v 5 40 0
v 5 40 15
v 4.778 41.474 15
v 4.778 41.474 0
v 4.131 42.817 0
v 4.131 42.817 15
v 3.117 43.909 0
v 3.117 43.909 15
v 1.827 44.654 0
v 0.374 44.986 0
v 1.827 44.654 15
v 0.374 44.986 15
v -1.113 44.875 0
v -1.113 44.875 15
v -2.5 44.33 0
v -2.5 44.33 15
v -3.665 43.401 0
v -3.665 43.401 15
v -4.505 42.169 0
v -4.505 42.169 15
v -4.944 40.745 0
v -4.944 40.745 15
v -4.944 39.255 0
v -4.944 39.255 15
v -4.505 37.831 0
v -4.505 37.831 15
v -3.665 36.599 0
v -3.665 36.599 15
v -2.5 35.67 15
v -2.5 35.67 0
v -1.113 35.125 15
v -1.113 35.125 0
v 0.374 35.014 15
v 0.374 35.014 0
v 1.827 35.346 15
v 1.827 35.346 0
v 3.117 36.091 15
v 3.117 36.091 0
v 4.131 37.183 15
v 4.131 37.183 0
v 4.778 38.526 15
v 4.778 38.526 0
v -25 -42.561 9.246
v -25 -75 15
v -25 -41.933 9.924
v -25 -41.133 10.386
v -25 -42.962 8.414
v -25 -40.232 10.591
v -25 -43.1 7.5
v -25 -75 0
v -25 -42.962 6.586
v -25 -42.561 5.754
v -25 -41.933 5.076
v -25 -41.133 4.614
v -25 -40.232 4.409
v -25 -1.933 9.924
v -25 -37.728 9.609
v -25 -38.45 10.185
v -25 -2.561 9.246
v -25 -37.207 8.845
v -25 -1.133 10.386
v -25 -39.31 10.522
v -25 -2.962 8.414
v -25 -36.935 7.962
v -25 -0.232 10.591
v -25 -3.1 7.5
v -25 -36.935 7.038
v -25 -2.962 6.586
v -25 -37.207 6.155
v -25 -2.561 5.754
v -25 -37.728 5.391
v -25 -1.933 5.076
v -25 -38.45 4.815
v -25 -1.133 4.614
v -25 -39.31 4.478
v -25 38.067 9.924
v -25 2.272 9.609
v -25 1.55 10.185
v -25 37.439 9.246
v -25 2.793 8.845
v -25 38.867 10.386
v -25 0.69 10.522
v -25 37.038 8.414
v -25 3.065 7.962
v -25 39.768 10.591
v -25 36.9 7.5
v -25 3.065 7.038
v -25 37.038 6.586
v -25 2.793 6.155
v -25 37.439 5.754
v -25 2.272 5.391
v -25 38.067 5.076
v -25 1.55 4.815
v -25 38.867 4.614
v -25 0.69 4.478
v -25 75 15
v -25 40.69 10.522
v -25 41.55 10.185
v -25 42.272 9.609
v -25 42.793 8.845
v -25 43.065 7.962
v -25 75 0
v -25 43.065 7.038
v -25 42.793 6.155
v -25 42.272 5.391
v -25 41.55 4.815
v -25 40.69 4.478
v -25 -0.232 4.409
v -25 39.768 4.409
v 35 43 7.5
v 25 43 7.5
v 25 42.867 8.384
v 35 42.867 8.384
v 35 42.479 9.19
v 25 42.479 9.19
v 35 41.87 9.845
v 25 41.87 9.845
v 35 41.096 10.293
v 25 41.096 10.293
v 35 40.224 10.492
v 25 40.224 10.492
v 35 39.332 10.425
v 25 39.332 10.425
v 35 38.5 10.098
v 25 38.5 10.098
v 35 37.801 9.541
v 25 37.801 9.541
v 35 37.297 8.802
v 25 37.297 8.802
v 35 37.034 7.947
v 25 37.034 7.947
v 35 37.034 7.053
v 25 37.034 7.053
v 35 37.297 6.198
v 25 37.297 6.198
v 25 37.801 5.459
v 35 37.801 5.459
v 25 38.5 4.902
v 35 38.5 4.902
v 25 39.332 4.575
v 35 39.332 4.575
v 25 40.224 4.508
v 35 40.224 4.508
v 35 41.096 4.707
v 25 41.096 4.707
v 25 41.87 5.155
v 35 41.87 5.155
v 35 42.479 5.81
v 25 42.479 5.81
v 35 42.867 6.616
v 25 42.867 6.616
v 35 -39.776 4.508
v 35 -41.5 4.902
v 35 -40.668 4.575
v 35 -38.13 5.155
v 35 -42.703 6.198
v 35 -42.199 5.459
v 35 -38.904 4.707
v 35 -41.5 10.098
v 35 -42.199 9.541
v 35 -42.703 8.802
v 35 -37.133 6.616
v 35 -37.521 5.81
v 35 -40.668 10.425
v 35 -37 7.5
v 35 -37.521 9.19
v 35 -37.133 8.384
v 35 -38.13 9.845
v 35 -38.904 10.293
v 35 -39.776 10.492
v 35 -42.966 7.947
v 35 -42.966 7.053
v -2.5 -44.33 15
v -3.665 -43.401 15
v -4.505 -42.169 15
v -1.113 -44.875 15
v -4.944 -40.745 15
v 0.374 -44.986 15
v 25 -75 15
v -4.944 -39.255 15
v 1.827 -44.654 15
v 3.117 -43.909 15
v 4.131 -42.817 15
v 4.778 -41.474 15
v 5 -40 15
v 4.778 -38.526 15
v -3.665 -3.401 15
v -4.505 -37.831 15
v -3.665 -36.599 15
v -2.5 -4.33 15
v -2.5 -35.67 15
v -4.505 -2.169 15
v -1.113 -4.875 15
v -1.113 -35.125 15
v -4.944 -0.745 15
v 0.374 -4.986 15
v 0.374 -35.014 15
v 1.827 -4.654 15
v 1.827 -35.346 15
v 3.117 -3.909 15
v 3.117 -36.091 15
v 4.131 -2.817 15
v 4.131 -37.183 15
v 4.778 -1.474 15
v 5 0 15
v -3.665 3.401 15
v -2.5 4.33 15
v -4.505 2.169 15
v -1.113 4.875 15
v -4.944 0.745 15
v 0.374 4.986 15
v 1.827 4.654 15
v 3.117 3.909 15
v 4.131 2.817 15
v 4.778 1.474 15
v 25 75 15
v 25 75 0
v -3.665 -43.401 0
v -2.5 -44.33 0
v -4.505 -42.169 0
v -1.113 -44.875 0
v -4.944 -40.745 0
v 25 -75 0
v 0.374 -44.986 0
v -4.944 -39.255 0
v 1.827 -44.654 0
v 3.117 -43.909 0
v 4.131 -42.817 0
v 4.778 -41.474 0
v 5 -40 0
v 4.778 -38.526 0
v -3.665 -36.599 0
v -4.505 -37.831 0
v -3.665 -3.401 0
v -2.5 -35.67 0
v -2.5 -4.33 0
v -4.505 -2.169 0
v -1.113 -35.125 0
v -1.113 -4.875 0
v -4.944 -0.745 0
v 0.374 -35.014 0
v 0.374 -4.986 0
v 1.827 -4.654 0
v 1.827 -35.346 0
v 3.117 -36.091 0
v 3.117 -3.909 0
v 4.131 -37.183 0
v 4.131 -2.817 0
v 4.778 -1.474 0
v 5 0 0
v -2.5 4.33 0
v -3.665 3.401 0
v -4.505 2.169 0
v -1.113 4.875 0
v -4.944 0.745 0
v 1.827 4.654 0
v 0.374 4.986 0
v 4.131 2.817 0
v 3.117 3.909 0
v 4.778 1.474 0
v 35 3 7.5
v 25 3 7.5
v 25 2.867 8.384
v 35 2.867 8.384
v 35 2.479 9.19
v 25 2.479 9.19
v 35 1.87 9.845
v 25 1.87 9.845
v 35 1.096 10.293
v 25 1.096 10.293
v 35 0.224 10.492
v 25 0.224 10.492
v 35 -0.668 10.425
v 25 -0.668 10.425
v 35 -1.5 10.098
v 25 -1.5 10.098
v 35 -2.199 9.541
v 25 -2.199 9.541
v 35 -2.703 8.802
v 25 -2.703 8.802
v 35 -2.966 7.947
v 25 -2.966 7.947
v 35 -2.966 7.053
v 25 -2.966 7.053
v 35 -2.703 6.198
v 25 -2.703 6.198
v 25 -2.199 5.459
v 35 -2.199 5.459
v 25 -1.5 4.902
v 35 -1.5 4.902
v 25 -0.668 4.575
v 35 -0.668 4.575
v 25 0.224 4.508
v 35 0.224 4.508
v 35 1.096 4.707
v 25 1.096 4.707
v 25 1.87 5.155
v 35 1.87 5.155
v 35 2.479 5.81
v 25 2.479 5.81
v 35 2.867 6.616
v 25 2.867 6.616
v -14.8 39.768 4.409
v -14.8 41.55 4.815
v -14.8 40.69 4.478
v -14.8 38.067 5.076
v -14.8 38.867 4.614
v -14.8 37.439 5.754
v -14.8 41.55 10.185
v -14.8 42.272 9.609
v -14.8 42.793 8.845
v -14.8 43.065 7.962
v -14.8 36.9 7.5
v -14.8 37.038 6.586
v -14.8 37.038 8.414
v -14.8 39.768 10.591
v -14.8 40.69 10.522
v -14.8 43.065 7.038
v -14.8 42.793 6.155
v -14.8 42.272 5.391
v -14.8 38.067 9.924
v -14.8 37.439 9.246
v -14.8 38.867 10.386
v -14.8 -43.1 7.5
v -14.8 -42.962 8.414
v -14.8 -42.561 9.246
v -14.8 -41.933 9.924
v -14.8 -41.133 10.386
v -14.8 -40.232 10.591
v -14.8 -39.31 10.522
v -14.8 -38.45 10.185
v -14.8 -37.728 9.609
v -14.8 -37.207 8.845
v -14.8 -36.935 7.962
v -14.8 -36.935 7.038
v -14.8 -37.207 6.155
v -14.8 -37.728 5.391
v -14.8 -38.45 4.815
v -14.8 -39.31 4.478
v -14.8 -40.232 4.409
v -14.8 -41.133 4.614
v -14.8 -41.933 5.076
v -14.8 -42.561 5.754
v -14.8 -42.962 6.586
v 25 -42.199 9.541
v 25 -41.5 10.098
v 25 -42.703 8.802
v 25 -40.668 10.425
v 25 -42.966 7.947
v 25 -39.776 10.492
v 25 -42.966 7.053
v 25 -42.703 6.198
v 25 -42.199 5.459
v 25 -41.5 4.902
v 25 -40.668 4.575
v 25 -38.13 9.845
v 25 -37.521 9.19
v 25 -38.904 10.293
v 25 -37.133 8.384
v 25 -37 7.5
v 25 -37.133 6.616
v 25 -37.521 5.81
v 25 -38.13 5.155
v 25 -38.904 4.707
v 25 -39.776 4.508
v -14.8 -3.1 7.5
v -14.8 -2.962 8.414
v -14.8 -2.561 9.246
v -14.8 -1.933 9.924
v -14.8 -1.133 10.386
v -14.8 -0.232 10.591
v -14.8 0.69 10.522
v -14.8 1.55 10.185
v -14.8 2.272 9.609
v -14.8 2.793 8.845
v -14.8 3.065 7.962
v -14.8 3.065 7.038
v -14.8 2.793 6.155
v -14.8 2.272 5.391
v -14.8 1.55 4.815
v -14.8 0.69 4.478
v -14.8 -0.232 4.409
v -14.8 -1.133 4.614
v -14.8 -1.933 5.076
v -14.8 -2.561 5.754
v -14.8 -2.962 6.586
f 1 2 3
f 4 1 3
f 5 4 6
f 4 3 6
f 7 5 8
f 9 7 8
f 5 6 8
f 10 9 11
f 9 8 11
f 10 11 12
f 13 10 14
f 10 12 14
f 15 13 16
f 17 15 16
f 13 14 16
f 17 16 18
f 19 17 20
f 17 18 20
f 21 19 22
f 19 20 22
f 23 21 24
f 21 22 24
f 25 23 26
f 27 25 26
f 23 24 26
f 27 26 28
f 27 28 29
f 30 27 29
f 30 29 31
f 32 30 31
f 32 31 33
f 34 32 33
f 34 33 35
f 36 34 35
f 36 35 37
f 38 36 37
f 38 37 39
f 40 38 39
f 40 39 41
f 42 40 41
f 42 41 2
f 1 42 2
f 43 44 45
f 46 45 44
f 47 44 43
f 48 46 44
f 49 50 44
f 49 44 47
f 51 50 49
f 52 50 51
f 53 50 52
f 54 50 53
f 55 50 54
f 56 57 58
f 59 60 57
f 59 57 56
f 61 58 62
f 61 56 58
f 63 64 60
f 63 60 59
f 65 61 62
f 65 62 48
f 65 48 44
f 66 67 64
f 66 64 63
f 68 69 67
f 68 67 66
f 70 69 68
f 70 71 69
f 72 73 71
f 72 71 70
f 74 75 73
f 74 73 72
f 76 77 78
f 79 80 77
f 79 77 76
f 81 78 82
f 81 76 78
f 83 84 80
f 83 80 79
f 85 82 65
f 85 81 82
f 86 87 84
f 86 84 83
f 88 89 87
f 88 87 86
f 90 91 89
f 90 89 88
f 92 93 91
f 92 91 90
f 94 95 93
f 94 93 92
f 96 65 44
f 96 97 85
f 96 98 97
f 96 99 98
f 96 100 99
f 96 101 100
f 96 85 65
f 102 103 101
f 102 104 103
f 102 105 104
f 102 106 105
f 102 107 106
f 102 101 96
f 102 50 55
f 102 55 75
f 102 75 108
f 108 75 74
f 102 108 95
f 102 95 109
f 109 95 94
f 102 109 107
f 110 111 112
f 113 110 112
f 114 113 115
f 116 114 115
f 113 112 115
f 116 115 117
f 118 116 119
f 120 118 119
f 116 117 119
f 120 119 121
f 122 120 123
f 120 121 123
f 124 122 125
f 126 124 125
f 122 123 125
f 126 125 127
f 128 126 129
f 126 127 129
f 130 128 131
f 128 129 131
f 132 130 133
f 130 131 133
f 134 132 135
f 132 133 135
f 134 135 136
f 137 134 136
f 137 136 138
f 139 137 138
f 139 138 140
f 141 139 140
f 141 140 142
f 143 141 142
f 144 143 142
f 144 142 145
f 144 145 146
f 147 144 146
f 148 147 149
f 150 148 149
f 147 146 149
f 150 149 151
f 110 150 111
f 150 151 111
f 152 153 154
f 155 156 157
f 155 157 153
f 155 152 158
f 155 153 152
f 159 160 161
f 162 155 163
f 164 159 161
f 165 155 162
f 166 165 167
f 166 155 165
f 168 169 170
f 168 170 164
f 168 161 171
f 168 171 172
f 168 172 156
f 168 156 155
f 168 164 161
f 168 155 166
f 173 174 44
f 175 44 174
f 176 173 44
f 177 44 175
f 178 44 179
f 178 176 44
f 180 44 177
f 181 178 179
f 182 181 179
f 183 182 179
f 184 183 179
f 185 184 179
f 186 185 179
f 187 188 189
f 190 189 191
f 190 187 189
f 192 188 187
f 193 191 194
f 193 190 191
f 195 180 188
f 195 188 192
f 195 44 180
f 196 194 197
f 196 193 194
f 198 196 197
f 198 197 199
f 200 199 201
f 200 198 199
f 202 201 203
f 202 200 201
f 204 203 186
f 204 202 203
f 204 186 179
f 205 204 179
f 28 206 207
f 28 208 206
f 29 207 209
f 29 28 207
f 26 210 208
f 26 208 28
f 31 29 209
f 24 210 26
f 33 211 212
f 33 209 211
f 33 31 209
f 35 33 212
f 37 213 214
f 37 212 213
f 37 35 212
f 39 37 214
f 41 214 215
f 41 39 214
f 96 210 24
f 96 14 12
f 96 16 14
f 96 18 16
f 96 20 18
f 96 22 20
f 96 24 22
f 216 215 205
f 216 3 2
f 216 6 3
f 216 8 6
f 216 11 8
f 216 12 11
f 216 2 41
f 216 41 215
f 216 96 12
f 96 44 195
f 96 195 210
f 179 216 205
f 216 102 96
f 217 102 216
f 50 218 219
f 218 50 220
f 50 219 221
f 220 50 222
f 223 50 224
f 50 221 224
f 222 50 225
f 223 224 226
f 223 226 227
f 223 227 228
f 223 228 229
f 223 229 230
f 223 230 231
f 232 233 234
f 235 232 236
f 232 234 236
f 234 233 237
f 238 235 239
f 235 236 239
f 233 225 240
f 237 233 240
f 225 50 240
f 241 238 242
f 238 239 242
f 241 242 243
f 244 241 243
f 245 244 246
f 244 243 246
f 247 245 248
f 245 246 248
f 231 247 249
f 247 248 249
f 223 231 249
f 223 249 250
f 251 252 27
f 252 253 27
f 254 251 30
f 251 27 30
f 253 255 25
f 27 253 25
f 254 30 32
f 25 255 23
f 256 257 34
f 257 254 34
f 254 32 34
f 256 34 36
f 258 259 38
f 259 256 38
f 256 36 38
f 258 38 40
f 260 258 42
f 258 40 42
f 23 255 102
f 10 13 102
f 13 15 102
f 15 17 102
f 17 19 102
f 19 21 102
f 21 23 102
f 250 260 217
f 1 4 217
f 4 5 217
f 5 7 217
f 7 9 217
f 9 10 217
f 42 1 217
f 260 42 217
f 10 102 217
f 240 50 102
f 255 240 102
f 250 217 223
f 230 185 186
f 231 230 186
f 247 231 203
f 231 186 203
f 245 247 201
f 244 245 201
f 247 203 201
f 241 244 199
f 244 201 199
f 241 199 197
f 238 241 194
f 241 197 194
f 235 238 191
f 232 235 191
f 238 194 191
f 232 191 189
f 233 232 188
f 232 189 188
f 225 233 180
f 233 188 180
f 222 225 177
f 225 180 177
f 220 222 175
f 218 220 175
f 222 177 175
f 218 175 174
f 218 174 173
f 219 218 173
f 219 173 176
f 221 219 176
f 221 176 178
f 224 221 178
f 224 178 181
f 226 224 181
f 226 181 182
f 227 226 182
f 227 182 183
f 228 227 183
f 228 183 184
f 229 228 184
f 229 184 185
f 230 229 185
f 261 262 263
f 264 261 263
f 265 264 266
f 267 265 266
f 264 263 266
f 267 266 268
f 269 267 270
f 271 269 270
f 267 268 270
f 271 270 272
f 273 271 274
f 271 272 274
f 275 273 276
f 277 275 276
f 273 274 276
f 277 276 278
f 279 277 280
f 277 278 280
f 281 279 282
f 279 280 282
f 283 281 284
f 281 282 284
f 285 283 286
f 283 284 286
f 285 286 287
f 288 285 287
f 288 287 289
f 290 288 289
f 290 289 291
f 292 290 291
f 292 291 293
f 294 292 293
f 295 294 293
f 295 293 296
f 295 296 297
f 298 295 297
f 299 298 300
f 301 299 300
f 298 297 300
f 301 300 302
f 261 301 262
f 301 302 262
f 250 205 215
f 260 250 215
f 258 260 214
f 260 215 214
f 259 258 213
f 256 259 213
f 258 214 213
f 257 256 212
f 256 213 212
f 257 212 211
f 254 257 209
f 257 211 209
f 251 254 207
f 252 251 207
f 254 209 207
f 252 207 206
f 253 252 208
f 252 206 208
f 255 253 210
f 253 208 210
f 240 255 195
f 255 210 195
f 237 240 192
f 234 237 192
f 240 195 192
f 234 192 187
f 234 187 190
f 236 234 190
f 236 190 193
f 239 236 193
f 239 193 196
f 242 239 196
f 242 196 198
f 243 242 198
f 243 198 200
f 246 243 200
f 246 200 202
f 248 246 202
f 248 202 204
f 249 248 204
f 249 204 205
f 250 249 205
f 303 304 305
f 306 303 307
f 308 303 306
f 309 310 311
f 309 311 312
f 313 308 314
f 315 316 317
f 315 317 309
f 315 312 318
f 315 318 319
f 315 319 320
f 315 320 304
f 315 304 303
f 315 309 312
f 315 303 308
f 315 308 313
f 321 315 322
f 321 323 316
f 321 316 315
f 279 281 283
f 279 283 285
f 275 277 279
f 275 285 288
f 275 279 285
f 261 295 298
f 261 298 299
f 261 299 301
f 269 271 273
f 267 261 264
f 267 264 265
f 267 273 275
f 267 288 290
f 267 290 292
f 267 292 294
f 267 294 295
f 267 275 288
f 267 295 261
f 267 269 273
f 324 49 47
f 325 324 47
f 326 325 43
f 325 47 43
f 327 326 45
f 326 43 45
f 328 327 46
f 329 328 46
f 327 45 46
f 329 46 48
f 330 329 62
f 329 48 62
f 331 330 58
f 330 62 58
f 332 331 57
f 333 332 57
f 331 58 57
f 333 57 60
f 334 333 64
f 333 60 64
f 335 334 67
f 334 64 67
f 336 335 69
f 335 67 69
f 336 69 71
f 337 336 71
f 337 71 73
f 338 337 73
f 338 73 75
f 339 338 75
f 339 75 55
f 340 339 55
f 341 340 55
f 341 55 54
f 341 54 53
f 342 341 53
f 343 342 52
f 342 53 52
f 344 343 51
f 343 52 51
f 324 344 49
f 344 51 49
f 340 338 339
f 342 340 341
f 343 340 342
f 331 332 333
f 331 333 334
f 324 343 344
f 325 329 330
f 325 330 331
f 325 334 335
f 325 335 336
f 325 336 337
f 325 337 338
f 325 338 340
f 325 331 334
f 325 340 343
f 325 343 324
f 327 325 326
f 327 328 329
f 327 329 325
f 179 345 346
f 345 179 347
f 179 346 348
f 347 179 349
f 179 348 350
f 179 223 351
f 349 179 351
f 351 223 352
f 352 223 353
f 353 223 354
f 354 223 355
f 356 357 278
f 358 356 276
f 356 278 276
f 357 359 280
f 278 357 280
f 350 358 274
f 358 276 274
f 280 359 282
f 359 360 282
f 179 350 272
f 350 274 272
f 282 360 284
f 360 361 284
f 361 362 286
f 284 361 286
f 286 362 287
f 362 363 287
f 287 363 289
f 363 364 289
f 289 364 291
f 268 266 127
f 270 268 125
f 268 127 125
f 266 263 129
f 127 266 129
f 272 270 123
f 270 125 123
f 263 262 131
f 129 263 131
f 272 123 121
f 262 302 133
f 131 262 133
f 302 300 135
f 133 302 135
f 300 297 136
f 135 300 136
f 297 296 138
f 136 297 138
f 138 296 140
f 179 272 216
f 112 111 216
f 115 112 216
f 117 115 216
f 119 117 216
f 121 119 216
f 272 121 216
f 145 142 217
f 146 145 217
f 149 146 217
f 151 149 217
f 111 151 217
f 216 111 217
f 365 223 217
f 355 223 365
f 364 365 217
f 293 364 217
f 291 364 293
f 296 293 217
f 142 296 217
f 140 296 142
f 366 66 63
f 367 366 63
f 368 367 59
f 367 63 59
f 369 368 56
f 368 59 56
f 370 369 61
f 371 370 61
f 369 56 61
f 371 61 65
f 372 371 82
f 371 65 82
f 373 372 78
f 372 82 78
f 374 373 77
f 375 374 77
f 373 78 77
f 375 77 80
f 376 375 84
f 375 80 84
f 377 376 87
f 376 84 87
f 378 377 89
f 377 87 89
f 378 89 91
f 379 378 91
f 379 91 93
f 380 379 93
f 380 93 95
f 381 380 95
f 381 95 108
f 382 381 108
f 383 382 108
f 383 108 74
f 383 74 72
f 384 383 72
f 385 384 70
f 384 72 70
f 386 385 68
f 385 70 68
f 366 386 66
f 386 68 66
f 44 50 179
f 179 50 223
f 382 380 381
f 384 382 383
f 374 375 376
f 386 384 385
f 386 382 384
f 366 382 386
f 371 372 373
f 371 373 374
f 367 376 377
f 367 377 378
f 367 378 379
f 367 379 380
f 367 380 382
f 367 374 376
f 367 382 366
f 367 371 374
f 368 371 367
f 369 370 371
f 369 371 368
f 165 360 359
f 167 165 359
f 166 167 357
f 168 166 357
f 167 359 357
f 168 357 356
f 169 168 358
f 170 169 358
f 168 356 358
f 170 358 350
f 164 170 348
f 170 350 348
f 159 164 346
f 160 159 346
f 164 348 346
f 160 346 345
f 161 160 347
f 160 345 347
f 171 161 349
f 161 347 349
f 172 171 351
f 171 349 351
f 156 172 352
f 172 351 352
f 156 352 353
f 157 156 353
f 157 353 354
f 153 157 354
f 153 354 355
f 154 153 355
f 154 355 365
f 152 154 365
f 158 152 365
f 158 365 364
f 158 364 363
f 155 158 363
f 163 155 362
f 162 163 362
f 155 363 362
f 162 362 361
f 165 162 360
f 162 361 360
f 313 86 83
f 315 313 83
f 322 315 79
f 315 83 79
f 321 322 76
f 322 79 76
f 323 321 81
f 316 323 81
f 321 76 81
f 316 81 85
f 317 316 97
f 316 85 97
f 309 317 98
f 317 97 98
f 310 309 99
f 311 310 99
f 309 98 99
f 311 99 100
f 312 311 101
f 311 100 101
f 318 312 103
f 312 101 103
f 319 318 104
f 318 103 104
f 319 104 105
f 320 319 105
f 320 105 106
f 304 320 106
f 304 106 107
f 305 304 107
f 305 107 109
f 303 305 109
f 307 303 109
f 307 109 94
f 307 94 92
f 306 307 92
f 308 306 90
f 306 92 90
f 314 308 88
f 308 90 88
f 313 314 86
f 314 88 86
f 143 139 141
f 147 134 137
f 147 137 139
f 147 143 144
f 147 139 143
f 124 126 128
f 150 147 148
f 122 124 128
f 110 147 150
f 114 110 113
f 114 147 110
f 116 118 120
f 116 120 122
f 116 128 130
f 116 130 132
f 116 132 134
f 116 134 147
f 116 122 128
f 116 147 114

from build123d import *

# Parameters (mm, degrees)
F0_W     = 50
F0_H     = 150
F1_DEPTH = 15
F2_R     = 5
F3_DEPTH = 25
F4_R     = 3
F5_DEPTH = 10
F6_R     = 3.1
F7_DEPTH = 10.2


with BuildPart() as f1:
    # F0 (on Top) → F1 (new body)
    with BuildSketch(Plane.XY):
        Rectangle(F0_W, F0_H)
    extrude(amount=F1_DEPTH)

    # F2 (on face) → F3 (cut)
    with BuildSketch(Plane.XY.offset(15)):
        with Locations((0, 40)):
            Circle(F2_R)
        Circle(F2_R)
        with Locations((0, -40)):
            Circle(F2_R)
    extrude(amount=-F3_DEPTH, mode=Mode.SUBTRACT)

    # F4 (on face) → F5 (join)
    with BuildSketch(Plane.YZ.offset(25)):
        with Locations((-40, 7.5)):
            Circle(F4_R)
        with Locations((0, 7.5)):
            Circle(F4_R)
        with Locations((40, 7.5)):
            Circle(F4_R)
    extrude(amount=F5_DEPTH)

    # F6 (on face) → F7 (cut)
    with BuildSketch(Plane(origin=(-25, 0, 0), x_dir=(0, -1, 0), z_dir=(-1, 0, 0))):
        with Locations((-40, 7.5)):
            Circle(F6_R)
        with Locations((0, 7.5)):
            Circle(F6_R)
        with Locations((40, 7.5)):
            Circle(F6_R)
    extrude(amount=-F7_DEPTH, mode=Mode.SUBTRACT)


solid = f1.part
